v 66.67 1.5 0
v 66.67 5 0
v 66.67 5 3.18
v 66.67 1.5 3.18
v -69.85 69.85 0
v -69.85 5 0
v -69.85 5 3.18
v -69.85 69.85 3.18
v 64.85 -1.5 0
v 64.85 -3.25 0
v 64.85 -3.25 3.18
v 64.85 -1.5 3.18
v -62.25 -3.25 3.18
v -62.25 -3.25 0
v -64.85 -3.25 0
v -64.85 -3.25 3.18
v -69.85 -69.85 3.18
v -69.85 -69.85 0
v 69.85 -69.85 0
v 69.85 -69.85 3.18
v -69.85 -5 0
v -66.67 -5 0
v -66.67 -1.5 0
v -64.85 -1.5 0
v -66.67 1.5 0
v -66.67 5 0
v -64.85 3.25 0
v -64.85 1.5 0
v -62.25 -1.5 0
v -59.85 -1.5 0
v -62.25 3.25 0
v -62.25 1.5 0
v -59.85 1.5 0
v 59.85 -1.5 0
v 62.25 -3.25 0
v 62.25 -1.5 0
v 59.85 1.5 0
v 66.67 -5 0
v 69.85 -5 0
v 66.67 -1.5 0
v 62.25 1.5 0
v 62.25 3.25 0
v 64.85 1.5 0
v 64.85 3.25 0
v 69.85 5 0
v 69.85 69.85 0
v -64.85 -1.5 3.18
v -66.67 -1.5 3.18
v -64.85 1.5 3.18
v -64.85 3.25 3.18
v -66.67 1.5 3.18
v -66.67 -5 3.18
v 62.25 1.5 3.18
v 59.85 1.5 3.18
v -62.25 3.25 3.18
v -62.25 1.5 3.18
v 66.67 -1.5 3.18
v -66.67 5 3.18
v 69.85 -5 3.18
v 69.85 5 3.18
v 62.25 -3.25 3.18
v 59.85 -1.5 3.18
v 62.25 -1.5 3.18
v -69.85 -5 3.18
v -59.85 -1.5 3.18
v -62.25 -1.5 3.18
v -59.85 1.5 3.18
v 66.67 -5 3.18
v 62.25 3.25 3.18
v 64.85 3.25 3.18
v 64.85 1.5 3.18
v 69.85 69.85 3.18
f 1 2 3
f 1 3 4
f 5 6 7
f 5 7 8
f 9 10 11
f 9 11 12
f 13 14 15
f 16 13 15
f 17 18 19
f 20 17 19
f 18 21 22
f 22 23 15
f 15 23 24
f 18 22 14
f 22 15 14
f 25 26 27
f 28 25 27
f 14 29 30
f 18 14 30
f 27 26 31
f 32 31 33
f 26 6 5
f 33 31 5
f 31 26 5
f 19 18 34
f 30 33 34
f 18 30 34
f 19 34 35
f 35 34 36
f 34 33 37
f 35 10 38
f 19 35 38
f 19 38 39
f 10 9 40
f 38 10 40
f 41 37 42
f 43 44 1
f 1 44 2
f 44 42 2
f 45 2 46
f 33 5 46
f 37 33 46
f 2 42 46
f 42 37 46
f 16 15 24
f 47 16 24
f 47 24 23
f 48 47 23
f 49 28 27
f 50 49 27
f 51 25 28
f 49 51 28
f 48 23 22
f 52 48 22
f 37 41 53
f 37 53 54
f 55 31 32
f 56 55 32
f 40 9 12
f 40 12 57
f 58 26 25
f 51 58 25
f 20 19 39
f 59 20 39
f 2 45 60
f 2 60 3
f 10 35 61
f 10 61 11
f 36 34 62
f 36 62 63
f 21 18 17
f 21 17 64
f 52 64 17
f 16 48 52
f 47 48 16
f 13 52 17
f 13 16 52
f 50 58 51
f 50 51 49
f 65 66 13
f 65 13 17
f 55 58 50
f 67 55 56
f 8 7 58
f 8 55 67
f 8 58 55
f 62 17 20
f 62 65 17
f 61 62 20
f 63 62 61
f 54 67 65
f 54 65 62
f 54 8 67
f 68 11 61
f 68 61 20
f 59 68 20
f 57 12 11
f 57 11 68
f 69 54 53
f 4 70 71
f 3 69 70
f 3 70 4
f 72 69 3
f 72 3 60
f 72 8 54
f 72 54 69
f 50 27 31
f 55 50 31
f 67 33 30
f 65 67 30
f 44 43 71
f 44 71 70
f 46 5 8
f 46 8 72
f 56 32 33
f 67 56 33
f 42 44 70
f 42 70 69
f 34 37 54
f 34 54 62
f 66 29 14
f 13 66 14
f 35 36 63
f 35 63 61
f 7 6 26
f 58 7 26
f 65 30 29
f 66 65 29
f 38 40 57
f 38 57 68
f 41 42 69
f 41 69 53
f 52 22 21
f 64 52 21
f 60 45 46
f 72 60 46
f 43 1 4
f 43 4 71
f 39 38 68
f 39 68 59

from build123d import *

# Parameters (mm, degrees)
SKETCH1_W           = 139.7
SKETCH1_H           = 139.7
BOSS_EXTRUDE1_DEPTH = 3.18
CUT_EXTRUDE1_DEPTH  = 4.18
CUT_EXTRUDE3_DEPTH  = 10


with BuildPart() as part:
    # Sketch1 → Boss-Extrude1 (new body)
    with BuildSketch(Plane.XY):
        Rectangle(SKETCH1_W, SKETCH1_H)
    extrude(amount=BOSS_EXTRUDE1_DEPTH)

    # Sketch21 → Cut-Extrude1 (cut, through all)
    with BuildSketch(Plane(origin=(-38.395626554, -37.199596717, 0), x_dir=(-1, 0, 0), z_dir=(0, 0, -1))):
        Polygon((28.274373446, 35.699596717), (28.274373446, 32.199596717), (31.454373446, 32.199596717), (31.454373446, 42.199596717), (28.274373446, 42.199596717), (28.274373446, 38.699596717), (26.454373446, 38.699596717), (26.454373446, 40.449596717), (23.854373446, 40.449596717), (23.854373446, 38.699596717), (21.454373446, 38.699596717), (21.454373446, 35.699596717), (23.854373446, 35.699596717), (23.854373446, 33.949596717), (26.454373446, 33.949596717), (26.454373446, 35.699596717), align=None)
    extrude(amount=-CUT_EXTRUDE1_DEPTH, mode=Mode.SUBTRACT)

    # Sketch22 → Cut-Extrude3 (cut)
    with BuildSketch(Plane(origin=(0, 0, 0), x_dir=(-1, 0, 0), z_dir=(0, 0, -1))):
        Polygon((-66.67, -5), (-69.85, -5), (-69.85, 5), (-66.67, 5), (-66.67, 1.5), (-64.85, 1.5), (-64.85, 3.25), (-62.25, 3.25), (-62.25, 1.5), (-59.85, 1.5), (-59.85, -1.5), (-62.25, -1.5), (-62.25, -3.25), (-64.85, -3.25), (-64.85, -1.5), (-66.67, -1.5), align=None)
    extrude(amount=-CUT_EXTRUDE3_DEPTH, mode=Mode.SUBTRACT)


solid = part.part
